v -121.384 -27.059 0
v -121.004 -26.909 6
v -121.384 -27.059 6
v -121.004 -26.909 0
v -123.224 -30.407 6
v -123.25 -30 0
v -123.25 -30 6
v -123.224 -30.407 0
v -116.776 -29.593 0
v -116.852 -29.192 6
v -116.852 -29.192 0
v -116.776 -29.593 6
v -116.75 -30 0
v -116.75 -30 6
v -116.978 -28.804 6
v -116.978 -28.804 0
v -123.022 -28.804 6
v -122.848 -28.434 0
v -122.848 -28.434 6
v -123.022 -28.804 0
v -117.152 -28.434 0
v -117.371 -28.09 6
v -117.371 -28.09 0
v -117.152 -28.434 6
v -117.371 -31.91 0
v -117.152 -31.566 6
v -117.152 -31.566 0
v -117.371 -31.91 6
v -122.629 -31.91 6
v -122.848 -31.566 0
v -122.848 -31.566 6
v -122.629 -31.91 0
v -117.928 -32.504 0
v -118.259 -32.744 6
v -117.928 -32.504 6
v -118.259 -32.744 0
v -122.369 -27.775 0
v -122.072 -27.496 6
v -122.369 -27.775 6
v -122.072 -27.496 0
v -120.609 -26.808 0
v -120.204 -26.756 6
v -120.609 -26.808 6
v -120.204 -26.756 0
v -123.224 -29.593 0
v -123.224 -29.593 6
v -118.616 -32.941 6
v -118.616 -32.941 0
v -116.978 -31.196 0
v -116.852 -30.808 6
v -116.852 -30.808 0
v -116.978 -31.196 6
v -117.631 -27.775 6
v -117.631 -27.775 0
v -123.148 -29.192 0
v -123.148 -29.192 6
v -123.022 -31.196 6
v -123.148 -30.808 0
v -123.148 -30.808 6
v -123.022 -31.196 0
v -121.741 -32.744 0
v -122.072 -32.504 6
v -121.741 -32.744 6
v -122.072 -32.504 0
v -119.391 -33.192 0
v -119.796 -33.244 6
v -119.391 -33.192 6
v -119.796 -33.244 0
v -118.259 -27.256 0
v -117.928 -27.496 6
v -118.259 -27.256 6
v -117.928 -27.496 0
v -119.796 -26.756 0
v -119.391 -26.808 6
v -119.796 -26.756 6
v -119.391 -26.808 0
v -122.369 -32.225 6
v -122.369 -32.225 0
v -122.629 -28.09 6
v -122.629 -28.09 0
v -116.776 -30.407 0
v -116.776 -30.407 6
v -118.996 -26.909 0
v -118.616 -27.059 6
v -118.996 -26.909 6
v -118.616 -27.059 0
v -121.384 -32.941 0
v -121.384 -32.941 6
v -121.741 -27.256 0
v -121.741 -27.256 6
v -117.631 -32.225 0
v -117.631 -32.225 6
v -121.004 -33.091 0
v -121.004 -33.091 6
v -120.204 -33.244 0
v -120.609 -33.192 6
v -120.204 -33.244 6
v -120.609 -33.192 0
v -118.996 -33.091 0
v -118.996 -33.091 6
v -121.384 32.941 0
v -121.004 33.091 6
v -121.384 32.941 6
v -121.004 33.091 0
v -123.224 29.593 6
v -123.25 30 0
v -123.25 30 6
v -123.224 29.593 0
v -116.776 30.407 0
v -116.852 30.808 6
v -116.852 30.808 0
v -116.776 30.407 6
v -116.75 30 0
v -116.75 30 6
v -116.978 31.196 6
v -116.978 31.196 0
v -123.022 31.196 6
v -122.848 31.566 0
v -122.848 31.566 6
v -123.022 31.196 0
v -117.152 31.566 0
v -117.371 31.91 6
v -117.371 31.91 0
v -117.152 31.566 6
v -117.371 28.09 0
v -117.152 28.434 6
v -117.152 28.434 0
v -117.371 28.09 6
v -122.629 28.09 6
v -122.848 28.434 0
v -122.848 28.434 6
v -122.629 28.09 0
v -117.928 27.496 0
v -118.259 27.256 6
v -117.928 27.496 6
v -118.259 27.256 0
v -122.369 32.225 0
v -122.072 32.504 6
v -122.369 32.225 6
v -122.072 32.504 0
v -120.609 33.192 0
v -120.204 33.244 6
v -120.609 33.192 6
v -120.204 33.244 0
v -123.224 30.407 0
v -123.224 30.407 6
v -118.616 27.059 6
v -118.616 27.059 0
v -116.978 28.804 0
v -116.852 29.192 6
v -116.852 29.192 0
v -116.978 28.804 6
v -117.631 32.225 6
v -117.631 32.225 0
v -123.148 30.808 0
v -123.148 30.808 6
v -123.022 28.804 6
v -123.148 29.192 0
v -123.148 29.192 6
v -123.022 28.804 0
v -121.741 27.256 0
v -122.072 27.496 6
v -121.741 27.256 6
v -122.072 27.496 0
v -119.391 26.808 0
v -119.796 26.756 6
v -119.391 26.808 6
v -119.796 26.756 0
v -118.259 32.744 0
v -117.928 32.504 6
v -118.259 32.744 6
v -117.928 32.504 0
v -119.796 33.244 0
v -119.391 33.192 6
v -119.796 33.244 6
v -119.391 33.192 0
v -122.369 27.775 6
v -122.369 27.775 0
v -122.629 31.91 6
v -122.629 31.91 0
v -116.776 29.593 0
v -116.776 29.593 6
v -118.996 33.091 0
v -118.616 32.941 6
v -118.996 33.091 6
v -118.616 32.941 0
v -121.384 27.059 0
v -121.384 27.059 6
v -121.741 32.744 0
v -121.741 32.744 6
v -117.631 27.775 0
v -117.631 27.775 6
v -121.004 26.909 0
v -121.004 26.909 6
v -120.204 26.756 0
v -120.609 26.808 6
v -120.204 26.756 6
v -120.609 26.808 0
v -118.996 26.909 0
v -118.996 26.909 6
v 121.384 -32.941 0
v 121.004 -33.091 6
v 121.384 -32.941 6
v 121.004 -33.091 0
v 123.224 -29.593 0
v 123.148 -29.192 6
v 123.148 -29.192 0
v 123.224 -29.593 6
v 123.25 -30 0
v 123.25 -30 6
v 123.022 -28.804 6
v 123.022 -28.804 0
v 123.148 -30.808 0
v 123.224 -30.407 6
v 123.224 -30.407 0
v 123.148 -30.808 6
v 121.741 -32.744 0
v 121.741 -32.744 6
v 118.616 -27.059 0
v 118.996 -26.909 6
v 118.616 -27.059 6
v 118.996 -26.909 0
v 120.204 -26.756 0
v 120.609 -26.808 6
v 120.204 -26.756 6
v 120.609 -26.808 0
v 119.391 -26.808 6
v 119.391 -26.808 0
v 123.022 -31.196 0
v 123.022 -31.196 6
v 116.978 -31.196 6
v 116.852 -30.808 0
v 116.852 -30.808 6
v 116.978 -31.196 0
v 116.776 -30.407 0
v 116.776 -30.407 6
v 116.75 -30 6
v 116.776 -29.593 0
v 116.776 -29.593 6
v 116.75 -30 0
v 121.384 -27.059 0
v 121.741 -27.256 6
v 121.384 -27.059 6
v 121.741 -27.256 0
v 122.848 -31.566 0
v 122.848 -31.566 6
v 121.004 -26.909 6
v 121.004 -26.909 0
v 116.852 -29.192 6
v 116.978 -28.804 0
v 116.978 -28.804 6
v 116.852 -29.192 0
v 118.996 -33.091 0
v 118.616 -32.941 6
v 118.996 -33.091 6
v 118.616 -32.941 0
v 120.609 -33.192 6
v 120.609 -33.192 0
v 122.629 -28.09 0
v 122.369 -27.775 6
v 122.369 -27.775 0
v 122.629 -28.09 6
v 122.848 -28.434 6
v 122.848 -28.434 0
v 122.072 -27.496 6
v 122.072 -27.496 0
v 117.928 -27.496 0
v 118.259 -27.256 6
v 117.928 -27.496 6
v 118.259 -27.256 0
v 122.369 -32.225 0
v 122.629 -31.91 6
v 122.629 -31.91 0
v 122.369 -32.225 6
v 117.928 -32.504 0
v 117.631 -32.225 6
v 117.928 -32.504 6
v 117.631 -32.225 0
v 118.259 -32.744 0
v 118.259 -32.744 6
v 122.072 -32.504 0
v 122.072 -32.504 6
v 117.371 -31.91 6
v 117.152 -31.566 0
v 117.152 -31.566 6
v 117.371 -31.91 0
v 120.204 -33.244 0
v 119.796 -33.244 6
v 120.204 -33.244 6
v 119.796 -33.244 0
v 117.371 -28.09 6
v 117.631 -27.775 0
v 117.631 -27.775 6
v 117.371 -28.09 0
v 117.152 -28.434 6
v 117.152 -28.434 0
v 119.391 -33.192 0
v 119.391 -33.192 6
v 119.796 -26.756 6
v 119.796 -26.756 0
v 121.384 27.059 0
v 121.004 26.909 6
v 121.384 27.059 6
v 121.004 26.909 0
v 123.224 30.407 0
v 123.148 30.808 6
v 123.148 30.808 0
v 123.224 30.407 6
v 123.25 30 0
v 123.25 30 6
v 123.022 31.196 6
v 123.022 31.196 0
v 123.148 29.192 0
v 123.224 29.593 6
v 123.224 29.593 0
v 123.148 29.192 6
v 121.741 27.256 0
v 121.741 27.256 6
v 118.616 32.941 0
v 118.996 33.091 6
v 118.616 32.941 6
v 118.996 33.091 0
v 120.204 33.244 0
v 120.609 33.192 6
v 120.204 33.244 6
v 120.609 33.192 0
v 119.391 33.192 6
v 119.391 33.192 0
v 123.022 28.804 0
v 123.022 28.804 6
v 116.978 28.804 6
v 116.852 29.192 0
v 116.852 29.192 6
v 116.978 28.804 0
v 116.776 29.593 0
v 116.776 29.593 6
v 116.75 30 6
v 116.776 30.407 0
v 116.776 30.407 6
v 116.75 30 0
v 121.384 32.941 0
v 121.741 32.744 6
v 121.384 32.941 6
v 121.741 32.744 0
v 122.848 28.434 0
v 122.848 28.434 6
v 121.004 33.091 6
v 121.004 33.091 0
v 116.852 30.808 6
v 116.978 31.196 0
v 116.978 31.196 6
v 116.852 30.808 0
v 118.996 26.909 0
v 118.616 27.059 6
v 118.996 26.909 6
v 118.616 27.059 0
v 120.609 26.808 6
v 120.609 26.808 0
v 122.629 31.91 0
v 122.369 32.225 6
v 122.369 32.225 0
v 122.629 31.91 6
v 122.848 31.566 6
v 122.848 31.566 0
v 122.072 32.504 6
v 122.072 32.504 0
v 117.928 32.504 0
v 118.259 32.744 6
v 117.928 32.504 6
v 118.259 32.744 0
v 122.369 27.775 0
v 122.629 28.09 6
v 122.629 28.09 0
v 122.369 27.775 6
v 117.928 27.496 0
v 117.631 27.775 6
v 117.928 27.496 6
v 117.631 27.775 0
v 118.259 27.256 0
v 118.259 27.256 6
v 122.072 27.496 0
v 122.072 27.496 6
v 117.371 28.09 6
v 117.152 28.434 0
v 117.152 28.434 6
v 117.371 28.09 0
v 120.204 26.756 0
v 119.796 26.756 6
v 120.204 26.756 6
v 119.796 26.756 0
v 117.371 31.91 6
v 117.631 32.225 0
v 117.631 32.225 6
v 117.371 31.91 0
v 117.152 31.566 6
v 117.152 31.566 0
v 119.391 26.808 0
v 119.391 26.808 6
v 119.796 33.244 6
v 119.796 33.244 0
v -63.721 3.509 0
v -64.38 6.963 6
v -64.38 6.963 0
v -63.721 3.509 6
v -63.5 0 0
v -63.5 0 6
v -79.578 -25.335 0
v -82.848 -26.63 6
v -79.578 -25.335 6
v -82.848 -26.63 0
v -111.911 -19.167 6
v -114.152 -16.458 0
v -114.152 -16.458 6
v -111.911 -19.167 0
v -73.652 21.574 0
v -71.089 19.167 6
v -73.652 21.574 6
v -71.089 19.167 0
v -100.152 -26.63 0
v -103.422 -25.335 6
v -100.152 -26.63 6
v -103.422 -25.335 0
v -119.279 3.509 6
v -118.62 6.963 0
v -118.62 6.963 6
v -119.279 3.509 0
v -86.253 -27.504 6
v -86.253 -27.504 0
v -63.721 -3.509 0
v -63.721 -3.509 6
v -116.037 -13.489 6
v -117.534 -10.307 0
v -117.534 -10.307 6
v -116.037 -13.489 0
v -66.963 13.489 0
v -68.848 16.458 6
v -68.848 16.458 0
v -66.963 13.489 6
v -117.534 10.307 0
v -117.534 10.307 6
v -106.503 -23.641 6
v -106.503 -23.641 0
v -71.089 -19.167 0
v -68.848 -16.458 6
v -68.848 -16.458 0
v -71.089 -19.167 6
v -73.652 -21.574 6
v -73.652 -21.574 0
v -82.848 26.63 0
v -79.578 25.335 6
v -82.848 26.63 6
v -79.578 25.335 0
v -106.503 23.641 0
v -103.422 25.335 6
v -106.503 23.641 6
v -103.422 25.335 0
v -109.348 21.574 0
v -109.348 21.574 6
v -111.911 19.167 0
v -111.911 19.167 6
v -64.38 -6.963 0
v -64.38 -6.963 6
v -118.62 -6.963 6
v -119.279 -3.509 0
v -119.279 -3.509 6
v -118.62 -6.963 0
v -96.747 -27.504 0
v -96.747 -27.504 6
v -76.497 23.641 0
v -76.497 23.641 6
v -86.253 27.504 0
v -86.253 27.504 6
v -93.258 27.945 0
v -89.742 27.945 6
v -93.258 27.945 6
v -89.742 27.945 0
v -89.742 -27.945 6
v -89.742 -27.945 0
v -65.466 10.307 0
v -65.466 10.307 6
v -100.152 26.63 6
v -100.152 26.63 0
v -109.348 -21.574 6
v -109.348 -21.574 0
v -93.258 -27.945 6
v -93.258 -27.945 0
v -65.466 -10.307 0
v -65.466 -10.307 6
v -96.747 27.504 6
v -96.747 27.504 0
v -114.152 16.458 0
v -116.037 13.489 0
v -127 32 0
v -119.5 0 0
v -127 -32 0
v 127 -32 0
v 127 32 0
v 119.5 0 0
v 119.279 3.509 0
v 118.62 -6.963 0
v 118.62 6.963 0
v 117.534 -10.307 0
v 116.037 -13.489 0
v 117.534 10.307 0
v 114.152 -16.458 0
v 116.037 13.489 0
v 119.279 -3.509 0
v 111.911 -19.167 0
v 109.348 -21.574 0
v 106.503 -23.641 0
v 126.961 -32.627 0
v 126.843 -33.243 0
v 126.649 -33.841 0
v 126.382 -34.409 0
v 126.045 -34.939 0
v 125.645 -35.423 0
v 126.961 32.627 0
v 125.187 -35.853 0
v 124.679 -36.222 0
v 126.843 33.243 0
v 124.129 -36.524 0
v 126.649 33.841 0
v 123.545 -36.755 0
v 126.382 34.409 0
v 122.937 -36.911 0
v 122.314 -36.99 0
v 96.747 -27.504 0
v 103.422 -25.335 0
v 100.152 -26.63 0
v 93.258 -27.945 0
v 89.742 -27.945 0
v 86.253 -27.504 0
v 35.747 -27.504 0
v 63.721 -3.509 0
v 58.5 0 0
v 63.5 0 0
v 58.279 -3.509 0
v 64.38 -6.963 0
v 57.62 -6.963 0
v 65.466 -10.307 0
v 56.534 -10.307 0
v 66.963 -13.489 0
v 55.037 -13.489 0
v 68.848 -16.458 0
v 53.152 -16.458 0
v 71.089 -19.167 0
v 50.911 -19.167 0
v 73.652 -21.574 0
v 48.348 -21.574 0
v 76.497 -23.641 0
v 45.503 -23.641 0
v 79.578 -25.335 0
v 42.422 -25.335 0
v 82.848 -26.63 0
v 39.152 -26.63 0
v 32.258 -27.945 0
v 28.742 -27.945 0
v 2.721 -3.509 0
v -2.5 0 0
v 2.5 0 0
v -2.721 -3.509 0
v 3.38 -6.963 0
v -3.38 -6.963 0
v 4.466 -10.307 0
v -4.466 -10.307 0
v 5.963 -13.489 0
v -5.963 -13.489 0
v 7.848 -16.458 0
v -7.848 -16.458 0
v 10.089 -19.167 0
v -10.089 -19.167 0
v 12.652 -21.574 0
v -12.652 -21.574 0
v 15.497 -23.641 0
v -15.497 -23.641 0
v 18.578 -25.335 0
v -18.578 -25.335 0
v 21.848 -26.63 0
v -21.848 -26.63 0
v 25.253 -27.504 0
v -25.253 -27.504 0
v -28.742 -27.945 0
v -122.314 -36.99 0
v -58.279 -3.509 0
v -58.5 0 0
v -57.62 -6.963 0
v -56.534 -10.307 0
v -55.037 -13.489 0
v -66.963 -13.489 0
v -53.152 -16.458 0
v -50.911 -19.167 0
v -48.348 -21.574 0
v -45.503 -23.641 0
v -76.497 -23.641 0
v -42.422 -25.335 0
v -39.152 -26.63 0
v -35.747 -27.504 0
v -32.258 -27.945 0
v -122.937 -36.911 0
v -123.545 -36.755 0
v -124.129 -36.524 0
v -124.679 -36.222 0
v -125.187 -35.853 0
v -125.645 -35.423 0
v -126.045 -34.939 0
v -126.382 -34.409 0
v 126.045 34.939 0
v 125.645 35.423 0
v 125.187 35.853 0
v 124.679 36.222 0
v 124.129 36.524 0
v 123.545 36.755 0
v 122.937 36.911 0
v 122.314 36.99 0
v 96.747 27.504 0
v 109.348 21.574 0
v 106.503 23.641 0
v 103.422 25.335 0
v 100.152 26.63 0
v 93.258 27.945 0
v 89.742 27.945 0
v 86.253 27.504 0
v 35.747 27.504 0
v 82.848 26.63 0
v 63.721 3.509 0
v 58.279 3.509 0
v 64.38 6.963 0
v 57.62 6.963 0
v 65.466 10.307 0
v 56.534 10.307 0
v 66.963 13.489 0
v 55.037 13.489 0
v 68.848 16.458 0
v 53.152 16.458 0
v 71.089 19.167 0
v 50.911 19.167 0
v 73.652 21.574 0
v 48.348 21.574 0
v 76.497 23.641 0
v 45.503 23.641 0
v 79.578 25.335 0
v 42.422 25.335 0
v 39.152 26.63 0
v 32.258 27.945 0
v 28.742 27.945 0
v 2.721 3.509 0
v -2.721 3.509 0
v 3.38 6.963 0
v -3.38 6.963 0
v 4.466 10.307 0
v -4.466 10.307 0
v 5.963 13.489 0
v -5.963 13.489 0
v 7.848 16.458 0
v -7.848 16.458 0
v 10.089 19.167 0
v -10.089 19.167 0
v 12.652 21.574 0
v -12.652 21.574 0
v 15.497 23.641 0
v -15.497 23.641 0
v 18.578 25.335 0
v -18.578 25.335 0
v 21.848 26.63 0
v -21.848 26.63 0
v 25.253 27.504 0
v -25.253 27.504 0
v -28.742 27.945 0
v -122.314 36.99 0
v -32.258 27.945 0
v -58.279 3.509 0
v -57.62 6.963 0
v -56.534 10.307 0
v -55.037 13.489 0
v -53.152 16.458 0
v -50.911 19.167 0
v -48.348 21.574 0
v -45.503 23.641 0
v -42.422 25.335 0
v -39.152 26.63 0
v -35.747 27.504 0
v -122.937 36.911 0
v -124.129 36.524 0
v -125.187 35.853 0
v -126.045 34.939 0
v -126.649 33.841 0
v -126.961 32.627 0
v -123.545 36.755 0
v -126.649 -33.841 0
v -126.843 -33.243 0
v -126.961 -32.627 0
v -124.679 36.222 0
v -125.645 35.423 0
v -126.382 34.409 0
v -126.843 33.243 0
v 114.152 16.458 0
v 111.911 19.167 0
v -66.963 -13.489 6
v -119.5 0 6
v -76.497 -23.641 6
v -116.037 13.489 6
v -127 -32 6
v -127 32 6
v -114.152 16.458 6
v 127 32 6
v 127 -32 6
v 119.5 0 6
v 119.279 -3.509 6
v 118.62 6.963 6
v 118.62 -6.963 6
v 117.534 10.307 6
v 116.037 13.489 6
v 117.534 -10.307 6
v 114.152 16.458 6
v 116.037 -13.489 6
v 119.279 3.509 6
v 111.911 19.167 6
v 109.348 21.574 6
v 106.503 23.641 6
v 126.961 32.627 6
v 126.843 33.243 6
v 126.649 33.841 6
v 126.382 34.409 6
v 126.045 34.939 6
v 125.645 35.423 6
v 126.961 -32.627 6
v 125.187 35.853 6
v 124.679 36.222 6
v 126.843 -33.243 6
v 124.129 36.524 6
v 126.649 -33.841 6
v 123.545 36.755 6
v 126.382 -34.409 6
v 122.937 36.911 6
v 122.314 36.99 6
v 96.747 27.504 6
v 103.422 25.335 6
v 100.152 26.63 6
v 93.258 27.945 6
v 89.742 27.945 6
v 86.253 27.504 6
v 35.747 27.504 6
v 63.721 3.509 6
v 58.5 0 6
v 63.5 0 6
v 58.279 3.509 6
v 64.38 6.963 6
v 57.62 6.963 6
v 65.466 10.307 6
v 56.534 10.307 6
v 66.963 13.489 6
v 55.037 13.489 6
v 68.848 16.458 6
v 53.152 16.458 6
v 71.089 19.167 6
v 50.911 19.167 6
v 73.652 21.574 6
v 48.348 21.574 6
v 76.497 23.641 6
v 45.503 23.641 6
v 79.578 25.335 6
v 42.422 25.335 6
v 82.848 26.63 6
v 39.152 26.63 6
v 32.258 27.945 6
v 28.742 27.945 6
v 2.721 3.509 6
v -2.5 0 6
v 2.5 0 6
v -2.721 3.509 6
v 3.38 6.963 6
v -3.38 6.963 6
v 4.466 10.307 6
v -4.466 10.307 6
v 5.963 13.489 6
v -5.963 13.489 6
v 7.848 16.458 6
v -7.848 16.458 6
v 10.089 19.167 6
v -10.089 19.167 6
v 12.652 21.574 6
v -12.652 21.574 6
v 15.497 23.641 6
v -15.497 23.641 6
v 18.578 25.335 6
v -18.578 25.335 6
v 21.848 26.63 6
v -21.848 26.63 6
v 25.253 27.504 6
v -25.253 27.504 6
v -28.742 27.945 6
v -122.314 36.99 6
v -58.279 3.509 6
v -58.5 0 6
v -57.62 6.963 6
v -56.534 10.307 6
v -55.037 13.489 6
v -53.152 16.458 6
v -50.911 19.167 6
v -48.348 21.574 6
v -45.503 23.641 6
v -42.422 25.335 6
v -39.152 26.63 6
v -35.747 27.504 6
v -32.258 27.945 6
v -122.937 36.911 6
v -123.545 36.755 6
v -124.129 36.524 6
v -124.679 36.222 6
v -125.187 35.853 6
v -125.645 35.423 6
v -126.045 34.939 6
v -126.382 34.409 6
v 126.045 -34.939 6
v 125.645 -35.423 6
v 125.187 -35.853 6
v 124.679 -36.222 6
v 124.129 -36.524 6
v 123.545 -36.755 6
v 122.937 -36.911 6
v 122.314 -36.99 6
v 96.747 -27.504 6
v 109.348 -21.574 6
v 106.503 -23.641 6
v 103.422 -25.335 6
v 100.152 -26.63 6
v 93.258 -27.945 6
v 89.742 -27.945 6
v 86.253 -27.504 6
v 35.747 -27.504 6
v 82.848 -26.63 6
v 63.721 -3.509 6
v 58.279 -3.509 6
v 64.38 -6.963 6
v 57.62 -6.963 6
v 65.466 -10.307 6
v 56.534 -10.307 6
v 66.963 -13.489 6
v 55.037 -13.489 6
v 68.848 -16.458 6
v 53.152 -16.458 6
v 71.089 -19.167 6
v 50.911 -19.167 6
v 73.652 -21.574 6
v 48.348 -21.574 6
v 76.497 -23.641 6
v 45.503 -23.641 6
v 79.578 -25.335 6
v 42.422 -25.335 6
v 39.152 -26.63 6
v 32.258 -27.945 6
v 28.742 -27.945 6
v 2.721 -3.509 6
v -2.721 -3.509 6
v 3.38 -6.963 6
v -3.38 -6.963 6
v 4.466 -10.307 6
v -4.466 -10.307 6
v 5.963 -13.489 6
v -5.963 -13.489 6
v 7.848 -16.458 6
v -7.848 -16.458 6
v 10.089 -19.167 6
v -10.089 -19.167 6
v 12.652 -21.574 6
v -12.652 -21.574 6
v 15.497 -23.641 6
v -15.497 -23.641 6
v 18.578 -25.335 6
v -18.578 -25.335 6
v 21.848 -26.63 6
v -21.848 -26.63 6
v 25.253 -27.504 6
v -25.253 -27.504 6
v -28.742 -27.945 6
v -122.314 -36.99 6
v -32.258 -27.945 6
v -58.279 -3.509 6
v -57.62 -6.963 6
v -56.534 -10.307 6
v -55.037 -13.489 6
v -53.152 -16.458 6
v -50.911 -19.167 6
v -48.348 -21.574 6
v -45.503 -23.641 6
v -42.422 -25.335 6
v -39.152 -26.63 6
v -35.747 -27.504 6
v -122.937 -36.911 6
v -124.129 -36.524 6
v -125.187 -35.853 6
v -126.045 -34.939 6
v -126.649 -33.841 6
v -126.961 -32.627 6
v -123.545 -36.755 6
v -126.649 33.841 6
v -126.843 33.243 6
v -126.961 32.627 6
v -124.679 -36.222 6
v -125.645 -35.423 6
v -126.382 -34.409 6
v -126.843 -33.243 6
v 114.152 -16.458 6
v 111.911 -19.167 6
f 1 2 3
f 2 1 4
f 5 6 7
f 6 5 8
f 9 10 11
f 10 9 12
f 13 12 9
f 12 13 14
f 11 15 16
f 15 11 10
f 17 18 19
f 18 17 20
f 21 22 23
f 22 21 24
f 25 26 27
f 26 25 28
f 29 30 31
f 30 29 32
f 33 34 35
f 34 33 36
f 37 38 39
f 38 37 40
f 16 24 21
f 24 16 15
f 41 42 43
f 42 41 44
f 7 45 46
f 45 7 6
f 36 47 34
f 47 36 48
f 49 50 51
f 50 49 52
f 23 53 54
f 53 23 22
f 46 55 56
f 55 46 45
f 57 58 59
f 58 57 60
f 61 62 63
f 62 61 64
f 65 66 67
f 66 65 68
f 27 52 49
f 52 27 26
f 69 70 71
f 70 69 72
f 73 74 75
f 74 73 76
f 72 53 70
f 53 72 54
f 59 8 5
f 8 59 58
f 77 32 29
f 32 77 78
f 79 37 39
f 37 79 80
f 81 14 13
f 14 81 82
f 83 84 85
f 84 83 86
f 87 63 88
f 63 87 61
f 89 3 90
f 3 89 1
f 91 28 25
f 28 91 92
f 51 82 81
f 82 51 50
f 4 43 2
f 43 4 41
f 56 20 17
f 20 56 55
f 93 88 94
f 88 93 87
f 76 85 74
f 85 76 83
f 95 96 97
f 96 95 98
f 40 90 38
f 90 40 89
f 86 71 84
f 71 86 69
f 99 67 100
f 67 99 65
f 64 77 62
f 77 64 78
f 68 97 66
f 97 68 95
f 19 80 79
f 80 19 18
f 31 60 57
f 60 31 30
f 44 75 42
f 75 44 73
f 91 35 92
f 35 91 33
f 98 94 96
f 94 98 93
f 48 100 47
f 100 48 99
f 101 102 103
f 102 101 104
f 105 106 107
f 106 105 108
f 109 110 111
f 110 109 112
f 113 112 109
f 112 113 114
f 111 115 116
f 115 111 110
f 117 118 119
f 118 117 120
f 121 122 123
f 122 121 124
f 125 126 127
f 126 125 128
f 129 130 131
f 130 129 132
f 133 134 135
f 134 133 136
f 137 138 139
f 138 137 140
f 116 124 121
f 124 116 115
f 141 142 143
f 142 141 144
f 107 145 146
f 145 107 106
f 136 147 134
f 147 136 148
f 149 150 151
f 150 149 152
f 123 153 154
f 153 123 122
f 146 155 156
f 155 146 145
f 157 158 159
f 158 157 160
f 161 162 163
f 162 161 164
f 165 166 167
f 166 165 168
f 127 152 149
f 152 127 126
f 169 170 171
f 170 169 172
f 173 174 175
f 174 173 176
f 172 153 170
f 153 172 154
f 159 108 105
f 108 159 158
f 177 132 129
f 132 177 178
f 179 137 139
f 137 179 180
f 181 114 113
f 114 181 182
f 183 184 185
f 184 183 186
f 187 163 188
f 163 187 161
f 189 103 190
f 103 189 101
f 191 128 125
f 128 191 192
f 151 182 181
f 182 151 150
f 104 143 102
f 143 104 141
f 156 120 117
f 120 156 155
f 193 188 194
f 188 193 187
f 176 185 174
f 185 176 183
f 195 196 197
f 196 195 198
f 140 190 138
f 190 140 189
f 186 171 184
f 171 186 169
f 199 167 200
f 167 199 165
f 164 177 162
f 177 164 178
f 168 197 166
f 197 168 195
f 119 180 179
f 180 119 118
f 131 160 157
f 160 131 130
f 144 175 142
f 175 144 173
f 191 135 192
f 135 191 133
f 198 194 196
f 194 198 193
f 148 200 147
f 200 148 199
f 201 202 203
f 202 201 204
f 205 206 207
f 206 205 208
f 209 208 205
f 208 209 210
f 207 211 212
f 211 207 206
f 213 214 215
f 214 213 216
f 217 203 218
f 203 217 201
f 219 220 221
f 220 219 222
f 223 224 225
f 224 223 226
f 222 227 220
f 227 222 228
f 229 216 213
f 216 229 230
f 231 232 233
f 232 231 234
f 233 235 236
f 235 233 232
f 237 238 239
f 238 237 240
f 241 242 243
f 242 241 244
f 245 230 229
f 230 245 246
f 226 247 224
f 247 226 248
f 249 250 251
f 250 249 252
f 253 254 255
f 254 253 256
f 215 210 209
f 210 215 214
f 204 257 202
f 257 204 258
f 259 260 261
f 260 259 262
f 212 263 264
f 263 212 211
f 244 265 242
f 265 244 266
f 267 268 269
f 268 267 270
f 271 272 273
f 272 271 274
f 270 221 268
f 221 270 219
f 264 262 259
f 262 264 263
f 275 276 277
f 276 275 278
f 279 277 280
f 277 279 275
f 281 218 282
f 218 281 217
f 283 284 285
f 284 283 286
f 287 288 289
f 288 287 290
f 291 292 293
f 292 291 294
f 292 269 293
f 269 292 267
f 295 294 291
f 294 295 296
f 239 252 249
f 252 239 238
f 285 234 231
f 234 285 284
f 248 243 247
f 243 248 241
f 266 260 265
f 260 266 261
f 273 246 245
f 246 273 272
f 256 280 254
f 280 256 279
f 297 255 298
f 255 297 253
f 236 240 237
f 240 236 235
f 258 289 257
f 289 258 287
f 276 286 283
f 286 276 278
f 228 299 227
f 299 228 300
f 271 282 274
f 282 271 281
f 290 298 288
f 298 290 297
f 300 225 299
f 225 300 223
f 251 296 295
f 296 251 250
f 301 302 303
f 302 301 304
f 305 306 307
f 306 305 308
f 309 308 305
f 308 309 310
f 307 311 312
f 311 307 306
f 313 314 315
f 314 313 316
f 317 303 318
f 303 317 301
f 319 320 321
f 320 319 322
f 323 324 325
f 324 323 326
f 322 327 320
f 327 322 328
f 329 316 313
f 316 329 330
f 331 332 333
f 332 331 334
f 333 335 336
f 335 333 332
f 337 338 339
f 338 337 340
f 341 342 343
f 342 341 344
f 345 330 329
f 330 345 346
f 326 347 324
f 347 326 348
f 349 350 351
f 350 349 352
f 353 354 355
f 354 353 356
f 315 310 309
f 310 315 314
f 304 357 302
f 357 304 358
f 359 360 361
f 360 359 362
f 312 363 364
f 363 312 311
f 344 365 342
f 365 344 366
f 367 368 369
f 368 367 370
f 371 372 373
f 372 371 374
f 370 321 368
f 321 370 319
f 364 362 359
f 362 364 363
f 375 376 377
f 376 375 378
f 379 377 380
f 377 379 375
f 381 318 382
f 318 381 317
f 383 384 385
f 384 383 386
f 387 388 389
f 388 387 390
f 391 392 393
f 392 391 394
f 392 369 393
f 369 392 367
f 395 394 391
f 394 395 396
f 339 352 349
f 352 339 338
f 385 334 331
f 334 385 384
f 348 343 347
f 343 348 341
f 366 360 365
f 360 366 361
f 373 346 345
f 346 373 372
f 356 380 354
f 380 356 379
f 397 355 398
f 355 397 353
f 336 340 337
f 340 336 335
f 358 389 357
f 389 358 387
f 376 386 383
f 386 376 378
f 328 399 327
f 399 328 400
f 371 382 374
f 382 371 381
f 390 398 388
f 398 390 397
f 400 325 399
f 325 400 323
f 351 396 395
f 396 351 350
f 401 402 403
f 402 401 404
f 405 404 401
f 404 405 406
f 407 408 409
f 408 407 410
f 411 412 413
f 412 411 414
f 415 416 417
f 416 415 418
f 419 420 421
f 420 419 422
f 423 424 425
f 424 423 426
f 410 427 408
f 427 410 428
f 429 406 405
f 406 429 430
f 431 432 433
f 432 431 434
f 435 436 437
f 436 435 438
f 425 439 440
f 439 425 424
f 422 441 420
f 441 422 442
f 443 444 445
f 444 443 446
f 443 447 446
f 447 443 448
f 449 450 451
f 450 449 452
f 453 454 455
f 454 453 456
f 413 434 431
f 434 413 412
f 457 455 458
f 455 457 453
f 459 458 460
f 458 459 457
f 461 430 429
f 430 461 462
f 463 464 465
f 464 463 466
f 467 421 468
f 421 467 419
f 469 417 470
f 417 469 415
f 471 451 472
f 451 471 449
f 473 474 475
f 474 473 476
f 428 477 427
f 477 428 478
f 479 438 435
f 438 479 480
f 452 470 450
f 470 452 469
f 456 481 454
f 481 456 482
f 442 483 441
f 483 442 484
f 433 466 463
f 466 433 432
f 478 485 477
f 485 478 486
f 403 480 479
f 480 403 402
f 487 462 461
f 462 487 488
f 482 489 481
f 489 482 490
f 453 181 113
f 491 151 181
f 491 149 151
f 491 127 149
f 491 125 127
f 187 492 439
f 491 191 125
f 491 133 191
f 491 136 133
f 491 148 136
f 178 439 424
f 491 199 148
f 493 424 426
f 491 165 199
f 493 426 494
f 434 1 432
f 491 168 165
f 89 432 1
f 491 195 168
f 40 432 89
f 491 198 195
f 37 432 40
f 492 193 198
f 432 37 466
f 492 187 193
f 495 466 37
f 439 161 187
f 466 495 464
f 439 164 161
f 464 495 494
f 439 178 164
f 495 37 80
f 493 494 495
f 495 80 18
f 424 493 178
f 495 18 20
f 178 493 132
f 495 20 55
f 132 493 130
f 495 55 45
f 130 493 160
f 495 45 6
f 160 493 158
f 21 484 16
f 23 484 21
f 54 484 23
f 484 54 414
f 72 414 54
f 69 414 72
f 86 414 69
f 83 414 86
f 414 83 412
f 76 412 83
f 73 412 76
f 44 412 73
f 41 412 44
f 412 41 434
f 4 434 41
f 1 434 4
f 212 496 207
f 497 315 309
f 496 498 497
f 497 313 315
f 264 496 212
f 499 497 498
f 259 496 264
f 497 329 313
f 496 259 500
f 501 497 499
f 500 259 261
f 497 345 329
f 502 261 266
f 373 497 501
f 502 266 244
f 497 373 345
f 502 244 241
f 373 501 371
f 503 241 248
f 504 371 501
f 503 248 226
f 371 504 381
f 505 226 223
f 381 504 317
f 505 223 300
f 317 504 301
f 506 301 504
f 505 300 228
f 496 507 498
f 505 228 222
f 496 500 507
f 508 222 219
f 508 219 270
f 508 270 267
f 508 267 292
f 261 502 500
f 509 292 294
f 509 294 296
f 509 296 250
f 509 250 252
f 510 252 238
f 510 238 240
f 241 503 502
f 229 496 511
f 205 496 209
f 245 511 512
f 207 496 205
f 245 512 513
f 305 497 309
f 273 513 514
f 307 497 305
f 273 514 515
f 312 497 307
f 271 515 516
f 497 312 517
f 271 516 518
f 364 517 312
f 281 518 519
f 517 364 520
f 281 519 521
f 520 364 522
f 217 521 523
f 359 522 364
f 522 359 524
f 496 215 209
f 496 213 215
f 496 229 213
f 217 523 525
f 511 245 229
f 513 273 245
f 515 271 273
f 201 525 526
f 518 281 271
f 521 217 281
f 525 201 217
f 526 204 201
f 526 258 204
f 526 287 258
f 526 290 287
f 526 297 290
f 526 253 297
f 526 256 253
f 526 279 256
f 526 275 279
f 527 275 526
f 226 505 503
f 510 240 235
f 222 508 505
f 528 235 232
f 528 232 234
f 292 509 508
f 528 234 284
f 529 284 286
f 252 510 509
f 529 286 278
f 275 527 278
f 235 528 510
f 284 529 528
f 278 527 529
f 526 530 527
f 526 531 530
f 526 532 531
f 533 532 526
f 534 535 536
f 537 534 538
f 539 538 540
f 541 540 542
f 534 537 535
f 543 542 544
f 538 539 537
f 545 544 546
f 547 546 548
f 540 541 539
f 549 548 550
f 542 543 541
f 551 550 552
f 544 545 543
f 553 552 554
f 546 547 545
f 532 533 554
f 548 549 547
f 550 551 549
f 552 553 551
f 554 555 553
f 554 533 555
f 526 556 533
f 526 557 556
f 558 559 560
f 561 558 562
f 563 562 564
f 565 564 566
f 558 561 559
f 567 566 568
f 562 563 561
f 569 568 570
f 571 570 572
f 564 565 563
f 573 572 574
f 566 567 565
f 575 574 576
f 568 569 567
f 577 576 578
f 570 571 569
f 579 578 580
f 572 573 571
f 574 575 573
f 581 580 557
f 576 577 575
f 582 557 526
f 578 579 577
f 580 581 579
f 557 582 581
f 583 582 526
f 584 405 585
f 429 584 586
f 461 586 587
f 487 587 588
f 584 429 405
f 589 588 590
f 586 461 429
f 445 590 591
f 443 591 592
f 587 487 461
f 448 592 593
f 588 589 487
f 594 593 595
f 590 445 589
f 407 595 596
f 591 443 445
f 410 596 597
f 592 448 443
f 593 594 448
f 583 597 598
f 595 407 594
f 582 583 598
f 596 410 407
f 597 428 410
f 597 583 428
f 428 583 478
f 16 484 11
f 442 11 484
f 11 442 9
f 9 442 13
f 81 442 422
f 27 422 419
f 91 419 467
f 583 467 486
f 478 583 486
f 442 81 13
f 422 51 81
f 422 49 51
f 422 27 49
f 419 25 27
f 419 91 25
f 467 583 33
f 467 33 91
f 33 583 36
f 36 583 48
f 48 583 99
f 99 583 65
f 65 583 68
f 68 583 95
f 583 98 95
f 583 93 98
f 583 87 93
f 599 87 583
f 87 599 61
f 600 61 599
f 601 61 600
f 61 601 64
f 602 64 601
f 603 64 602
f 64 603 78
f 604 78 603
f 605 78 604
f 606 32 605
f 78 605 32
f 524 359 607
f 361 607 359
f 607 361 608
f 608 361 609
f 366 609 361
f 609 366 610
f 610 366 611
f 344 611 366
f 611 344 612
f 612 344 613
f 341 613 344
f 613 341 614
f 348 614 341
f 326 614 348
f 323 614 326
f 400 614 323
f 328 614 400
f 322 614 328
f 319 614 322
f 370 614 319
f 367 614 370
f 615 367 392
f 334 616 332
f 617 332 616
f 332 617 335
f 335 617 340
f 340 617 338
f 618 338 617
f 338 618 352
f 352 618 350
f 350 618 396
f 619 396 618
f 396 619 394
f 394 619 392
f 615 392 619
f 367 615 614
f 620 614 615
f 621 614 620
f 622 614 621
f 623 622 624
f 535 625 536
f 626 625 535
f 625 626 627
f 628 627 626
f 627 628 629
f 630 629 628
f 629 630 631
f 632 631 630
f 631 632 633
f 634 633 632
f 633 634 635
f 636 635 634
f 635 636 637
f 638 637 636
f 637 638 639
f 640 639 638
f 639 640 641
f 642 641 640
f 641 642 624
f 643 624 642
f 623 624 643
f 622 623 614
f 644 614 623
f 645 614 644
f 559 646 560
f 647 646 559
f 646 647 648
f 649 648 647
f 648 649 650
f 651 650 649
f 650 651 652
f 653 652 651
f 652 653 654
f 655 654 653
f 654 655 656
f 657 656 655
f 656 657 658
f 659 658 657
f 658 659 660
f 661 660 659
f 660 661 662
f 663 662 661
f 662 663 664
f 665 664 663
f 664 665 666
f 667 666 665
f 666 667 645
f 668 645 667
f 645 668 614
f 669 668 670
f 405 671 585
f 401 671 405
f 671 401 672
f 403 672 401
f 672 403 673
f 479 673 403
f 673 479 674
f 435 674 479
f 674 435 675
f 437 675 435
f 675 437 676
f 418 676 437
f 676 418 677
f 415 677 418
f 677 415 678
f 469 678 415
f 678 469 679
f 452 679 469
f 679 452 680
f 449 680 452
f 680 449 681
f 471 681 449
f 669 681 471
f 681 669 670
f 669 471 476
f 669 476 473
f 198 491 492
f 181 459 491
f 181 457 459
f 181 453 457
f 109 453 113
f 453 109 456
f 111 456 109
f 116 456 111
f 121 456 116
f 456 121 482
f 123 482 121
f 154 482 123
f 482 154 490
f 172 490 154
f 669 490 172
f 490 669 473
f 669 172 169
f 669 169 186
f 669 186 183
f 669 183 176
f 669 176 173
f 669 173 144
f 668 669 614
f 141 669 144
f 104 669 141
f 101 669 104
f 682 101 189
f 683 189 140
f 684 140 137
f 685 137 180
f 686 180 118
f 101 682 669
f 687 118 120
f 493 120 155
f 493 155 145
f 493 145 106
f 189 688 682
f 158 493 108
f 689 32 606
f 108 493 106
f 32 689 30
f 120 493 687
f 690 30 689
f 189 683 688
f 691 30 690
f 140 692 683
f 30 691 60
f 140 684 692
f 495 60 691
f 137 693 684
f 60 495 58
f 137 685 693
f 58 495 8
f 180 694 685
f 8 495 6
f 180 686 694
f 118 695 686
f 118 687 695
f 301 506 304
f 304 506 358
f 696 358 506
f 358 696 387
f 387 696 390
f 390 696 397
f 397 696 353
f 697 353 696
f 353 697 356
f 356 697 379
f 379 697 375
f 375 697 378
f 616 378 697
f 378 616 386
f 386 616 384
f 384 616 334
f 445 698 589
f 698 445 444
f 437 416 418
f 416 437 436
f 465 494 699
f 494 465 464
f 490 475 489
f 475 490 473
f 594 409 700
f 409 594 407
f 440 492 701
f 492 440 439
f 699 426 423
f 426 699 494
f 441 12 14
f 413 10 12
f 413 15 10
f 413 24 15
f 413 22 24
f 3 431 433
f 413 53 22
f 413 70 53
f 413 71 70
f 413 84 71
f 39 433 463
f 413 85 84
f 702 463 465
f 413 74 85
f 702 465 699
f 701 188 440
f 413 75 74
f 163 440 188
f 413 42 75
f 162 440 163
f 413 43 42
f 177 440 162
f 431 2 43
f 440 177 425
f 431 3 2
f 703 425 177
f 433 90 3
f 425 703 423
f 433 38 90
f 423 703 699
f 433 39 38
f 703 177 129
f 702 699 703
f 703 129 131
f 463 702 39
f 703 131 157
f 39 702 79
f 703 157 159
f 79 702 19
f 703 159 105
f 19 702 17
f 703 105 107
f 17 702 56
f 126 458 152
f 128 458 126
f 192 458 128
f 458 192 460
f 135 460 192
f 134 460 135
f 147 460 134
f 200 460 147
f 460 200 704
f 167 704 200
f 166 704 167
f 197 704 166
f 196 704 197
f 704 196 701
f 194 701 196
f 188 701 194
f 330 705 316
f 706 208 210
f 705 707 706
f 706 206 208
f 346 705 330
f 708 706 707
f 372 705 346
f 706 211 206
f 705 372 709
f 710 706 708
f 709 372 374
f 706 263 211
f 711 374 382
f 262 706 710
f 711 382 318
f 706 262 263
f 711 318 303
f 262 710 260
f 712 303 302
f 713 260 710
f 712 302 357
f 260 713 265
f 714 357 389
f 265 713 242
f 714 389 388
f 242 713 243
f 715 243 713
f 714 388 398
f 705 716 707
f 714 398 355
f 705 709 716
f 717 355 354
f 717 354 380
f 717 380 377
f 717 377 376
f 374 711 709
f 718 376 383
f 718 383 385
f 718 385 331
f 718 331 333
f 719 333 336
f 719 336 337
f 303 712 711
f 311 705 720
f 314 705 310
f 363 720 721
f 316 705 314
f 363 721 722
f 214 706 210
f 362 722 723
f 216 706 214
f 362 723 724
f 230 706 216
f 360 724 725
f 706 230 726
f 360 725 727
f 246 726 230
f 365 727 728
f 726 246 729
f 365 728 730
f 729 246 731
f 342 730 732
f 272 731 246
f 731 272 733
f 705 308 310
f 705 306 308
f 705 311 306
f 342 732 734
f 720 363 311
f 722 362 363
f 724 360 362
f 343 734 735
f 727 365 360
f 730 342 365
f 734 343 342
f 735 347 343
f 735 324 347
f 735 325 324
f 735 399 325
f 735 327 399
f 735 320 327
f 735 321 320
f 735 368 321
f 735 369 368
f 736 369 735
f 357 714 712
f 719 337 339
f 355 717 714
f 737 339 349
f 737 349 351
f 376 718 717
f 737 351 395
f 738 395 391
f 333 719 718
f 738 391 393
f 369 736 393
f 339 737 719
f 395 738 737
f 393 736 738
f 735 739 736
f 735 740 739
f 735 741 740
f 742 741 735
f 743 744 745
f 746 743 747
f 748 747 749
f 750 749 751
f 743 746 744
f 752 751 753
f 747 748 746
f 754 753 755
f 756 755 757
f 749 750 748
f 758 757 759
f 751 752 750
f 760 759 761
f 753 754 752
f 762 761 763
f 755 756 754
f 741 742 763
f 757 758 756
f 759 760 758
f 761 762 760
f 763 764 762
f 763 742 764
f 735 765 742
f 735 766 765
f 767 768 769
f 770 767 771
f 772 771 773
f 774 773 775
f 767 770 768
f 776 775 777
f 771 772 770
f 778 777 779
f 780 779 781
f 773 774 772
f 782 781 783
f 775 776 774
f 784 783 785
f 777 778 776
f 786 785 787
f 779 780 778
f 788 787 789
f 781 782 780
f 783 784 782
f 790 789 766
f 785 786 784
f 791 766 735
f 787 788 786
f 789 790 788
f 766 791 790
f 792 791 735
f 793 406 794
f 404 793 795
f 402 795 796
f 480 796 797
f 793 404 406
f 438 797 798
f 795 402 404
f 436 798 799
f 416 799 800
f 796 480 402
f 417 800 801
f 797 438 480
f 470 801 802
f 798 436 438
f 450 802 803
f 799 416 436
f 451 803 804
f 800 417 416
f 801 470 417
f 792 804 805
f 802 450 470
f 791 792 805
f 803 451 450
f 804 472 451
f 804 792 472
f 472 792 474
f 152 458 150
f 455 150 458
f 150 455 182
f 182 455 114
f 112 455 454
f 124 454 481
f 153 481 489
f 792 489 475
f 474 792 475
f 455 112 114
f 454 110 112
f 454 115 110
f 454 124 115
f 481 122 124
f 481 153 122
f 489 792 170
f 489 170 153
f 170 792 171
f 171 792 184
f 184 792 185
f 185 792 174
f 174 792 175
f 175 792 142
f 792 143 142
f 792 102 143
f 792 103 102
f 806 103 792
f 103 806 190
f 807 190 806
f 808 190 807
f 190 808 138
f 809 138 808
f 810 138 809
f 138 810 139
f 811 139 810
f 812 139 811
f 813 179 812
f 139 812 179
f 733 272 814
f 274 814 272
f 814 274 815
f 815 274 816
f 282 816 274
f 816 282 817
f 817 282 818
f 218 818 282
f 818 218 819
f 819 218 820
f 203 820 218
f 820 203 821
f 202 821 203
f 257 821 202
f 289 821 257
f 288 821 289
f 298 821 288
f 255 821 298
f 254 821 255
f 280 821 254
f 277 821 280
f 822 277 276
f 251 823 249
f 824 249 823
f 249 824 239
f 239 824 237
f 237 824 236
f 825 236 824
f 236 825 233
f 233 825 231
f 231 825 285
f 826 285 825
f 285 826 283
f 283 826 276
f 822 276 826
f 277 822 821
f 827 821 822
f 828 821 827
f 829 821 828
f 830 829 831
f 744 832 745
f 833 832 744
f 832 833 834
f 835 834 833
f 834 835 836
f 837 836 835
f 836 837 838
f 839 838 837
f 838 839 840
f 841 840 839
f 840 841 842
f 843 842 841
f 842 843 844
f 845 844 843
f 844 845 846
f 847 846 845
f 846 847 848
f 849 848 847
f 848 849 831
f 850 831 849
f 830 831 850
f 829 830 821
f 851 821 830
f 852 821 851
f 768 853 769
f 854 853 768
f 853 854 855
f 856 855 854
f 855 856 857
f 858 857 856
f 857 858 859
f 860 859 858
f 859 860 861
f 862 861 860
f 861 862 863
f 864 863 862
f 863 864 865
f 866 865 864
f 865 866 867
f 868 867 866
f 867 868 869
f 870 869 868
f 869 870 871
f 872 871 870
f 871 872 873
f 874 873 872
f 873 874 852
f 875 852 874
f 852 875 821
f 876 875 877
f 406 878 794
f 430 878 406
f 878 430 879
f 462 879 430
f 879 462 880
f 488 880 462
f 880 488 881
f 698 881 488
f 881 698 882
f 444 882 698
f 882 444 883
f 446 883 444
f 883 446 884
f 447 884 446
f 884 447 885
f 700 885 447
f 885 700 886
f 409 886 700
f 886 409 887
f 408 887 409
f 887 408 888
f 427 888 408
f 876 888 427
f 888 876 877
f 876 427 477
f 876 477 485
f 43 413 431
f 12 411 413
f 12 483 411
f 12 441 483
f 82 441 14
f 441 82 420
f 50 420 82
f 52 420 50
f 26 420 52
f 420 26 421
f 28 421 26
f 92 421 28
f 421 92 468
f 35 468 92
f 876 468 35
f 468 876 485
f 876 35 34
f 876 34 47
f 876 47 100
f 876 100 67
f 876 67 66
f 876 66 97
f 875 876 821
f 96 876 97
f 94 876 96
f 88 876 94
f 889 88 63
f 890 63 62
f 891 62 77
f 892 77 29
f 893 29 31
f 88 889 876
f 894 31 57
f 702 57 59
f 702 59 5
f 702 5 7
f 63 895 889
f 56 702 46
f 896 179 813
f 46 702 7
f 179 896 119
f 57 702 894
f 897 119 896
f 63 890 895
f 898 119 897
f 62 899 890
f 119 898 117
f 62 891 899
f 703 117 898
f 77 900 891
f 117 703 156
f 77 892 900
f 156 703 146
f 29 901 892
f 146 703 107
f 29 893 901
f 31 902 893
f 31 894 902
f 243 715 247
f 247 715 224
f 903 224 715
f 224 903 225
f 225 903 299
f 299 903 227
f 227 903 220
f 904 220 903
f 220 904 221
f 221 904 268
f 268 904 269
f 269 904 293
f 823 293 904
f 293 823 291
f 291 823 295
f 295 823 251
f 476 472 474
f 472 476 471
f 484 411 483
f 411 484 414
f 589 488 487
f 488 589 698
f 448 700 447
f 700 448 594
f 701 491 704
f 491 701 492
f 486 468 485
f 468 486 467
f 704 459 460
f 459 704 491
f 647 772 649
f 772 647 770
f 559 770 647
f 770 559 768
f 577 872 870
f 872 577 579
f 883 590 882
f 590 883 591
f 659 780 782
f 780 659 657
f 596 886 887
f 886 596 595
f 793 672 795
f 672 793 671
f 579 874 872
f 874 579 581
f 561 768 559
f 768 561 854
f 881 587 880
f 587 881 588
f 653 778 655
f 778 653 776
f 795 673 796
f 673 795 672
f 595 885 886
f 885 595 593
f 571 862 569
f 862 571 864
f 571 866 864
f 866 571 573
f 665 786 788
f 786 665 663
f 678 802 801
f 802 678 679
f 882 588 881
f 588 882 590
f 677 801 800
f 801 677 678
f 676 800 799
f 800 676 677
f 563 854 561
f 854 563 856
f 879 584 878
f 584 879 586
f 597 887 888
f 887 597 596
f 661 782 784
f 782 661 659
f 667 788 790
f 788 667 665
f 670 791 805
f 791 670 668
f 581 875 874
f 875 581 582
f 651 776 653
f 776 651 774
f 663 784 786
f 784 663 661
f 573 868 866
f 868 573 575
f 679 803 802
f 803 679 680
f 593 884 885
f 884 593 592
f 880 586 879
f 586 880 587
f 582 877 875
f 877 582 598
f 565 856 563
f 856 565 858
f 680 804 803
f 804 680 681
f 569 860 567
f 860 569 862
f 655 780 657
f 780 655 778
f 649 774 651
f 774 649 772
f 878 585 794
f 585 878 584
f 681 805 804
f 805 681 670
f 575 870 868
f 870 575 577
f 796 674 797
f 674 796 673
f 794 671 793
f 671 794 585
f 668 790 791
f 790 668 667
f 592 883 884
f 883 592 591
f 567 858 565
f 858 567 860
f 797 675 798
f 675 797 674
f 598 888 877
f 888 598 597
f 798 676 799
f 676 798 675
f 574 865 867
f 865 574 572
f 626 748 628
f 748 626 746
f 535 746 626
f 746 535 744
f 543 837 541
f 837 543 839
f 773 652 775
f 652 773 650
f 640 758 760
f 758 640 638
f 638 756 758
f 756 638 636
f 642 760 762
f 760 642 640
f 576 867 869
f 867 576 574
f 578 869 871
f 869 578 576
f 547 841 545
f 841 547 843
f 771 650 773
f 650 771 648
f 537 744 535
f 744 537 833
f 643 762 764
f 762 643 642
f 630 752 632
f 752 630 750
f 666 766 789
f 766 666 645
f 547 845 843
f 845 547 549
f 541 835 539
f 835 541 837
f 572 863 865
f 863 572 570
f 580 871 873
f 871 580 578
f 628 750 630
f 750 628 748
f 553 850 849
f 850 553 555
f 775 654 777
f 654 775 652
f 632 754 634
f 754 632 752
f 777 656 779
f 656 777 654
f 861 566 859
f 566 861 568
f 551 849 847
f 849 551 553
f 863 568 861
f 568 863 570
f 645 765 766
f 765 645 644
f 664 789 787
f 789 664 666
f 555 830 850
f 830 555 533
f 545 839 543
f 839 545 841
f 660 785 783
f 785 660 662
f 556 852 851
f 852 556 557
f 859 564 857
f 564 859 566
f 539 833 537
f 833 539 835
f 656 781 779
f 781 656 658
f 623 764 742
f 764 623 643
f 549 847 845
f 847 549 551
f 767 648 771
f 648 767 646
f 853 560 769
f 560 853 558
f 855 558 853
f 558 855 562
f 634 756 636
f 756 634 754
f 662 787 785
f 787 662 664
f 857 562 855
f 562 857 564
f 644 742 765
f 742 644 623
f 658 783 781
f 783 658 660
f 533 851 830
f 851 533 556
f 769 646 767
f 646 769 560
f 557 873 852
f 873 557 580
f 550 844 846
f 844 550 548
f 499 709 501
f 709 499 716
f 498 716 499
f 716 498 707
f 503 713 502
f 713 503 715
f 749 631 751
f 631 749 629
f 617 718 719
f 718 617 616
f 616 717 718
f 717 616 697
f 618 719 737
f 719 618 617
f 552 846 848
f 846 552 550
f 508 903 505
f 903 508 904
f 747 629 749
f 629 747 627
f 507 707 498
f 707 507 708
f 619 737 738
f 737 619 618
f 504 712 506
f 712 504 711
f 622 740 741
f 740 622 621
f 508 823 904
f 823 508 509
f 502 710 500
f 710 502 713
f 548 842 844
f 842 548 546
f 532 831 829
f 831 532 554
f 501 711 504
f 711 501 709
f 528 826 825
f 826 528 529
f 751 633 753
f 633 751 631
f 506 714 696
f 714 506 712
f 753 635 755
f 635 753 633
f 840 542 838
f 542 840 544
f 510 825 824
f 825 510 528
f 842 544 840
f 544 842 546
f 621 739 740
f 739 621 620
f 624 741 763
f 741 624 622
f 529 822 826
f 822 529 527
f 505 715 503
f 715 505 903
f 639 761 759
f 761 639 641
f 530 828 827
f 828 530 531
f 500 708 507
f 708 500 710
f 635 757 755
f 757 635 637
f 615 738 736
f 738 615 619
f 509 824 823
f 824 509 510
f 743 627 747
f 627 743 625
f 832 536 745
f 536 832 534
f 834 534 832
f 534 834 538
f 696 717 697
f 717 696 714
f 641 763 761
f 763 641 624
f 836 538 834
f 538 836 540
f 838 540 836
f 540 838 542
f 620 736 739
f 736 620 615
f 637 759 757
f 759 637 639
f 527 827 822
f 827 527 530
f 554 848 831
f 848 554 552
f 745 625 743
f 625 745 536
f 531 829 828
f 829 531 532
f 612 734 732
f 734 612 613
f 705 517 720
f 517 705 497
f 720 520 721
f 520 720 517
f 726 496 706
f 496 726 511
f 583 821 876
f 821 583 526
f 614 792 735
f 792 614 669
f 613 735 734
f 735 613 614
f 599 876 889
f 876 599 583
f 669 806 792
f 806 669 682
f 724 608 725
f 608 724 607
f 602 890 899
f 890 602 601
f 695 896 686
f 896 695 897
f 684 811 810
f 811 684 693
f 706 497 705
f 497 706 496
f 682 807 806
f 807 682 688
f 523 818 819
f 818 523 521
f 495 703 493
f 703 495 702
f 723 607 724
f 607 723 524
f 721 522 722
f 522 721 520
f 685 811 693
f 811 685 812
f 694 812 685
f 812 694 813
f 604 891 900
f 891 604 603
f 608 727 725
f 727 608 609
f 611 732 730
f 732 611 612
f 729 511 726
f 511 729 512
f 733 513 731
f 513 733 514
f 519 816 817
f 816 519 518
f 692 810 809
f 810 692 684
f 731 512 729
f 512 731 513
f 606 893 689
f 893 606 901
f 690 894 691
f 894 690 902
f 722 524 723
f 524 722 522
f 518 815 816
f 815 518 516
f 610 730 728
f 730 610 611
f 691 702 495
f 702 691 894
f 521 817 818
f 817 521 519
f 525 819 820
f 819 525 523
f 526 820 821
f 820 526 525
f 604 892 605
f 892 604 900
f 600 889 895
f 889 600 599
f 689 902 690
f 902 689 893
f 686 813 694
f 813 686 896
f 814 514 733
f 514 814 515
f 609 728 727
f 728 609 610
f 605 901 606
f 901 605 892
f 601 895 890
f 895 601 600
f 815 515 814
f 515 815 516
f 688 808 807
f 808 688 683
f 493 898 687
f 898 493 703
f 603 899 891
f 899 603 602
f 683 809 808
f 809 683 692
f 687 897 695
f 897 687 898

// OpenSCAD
$fn = 50;

difference() {
	union() {
		hull() {
			translate(v = [-122.0, 32.0, 0]) {
				cylinder(h = 6, r = 5);
			}
			translate(v = [122.0, 32.0, 0]) {
				cylinder(h = 6, r = 5);
			}
			translate(v = [-122.0, -32.0, 0]) {
				cylinder(h = 6, r = 5);
			}
			translate(v = [122.0, -32.0, 0]) {
				cylinder(h = 6, r = 5);
			}
		}
	}
	union() {
		translate(v = [-120.0, -30.0, -100.0]) {
			cylinder(h = 200, r = 3.25);
		}
		translate(v = [-120.0, 30.0, -100.0]) {
			cylinder(h = 200, r = 3.25);
		}
		translate(v = [120.0, -30.0, -100.0]) {
			cylinder(h = 200, r = 3.25);
		}
		translate(v = [120.0, 30.0, -100.0]) {
			cylinder(h = 200, r = 3.25);
		}
		translate(v = [-120.0, -30.0, -100.0]) {
			cylinder(h = 200, r = 1.8);
		}
		translate(v = [-120.0, 30.0, -100.0]) {
			cylinder(h = 200, r = 1.8);
		}
		translate(v = [120.0, -30.0, -100.0]) {
			cylinder(h = 200, r = 1.8);
		}
		translate(v = [120.0, 30.0, -100.0]) {
			cylinder(h = 200, r = 1.8);
		}
		translate(v = [-91.5, 0, 0.0]) {
			cylinder(h = 6, r = 28.0);
		}
		translate(v = [-30.5, 0, 0.0]) {
			cylinder(h = 6, r = 28.0);
		}
		translate(v = [30.5, 0, 0.0]) {
			cylinder(h = 6, r = 28.0);
		}
		translate(v = [91.5, 0, 0.0]) {
			cylinder(h = 6, r = 28.0);
		}
	}
}
